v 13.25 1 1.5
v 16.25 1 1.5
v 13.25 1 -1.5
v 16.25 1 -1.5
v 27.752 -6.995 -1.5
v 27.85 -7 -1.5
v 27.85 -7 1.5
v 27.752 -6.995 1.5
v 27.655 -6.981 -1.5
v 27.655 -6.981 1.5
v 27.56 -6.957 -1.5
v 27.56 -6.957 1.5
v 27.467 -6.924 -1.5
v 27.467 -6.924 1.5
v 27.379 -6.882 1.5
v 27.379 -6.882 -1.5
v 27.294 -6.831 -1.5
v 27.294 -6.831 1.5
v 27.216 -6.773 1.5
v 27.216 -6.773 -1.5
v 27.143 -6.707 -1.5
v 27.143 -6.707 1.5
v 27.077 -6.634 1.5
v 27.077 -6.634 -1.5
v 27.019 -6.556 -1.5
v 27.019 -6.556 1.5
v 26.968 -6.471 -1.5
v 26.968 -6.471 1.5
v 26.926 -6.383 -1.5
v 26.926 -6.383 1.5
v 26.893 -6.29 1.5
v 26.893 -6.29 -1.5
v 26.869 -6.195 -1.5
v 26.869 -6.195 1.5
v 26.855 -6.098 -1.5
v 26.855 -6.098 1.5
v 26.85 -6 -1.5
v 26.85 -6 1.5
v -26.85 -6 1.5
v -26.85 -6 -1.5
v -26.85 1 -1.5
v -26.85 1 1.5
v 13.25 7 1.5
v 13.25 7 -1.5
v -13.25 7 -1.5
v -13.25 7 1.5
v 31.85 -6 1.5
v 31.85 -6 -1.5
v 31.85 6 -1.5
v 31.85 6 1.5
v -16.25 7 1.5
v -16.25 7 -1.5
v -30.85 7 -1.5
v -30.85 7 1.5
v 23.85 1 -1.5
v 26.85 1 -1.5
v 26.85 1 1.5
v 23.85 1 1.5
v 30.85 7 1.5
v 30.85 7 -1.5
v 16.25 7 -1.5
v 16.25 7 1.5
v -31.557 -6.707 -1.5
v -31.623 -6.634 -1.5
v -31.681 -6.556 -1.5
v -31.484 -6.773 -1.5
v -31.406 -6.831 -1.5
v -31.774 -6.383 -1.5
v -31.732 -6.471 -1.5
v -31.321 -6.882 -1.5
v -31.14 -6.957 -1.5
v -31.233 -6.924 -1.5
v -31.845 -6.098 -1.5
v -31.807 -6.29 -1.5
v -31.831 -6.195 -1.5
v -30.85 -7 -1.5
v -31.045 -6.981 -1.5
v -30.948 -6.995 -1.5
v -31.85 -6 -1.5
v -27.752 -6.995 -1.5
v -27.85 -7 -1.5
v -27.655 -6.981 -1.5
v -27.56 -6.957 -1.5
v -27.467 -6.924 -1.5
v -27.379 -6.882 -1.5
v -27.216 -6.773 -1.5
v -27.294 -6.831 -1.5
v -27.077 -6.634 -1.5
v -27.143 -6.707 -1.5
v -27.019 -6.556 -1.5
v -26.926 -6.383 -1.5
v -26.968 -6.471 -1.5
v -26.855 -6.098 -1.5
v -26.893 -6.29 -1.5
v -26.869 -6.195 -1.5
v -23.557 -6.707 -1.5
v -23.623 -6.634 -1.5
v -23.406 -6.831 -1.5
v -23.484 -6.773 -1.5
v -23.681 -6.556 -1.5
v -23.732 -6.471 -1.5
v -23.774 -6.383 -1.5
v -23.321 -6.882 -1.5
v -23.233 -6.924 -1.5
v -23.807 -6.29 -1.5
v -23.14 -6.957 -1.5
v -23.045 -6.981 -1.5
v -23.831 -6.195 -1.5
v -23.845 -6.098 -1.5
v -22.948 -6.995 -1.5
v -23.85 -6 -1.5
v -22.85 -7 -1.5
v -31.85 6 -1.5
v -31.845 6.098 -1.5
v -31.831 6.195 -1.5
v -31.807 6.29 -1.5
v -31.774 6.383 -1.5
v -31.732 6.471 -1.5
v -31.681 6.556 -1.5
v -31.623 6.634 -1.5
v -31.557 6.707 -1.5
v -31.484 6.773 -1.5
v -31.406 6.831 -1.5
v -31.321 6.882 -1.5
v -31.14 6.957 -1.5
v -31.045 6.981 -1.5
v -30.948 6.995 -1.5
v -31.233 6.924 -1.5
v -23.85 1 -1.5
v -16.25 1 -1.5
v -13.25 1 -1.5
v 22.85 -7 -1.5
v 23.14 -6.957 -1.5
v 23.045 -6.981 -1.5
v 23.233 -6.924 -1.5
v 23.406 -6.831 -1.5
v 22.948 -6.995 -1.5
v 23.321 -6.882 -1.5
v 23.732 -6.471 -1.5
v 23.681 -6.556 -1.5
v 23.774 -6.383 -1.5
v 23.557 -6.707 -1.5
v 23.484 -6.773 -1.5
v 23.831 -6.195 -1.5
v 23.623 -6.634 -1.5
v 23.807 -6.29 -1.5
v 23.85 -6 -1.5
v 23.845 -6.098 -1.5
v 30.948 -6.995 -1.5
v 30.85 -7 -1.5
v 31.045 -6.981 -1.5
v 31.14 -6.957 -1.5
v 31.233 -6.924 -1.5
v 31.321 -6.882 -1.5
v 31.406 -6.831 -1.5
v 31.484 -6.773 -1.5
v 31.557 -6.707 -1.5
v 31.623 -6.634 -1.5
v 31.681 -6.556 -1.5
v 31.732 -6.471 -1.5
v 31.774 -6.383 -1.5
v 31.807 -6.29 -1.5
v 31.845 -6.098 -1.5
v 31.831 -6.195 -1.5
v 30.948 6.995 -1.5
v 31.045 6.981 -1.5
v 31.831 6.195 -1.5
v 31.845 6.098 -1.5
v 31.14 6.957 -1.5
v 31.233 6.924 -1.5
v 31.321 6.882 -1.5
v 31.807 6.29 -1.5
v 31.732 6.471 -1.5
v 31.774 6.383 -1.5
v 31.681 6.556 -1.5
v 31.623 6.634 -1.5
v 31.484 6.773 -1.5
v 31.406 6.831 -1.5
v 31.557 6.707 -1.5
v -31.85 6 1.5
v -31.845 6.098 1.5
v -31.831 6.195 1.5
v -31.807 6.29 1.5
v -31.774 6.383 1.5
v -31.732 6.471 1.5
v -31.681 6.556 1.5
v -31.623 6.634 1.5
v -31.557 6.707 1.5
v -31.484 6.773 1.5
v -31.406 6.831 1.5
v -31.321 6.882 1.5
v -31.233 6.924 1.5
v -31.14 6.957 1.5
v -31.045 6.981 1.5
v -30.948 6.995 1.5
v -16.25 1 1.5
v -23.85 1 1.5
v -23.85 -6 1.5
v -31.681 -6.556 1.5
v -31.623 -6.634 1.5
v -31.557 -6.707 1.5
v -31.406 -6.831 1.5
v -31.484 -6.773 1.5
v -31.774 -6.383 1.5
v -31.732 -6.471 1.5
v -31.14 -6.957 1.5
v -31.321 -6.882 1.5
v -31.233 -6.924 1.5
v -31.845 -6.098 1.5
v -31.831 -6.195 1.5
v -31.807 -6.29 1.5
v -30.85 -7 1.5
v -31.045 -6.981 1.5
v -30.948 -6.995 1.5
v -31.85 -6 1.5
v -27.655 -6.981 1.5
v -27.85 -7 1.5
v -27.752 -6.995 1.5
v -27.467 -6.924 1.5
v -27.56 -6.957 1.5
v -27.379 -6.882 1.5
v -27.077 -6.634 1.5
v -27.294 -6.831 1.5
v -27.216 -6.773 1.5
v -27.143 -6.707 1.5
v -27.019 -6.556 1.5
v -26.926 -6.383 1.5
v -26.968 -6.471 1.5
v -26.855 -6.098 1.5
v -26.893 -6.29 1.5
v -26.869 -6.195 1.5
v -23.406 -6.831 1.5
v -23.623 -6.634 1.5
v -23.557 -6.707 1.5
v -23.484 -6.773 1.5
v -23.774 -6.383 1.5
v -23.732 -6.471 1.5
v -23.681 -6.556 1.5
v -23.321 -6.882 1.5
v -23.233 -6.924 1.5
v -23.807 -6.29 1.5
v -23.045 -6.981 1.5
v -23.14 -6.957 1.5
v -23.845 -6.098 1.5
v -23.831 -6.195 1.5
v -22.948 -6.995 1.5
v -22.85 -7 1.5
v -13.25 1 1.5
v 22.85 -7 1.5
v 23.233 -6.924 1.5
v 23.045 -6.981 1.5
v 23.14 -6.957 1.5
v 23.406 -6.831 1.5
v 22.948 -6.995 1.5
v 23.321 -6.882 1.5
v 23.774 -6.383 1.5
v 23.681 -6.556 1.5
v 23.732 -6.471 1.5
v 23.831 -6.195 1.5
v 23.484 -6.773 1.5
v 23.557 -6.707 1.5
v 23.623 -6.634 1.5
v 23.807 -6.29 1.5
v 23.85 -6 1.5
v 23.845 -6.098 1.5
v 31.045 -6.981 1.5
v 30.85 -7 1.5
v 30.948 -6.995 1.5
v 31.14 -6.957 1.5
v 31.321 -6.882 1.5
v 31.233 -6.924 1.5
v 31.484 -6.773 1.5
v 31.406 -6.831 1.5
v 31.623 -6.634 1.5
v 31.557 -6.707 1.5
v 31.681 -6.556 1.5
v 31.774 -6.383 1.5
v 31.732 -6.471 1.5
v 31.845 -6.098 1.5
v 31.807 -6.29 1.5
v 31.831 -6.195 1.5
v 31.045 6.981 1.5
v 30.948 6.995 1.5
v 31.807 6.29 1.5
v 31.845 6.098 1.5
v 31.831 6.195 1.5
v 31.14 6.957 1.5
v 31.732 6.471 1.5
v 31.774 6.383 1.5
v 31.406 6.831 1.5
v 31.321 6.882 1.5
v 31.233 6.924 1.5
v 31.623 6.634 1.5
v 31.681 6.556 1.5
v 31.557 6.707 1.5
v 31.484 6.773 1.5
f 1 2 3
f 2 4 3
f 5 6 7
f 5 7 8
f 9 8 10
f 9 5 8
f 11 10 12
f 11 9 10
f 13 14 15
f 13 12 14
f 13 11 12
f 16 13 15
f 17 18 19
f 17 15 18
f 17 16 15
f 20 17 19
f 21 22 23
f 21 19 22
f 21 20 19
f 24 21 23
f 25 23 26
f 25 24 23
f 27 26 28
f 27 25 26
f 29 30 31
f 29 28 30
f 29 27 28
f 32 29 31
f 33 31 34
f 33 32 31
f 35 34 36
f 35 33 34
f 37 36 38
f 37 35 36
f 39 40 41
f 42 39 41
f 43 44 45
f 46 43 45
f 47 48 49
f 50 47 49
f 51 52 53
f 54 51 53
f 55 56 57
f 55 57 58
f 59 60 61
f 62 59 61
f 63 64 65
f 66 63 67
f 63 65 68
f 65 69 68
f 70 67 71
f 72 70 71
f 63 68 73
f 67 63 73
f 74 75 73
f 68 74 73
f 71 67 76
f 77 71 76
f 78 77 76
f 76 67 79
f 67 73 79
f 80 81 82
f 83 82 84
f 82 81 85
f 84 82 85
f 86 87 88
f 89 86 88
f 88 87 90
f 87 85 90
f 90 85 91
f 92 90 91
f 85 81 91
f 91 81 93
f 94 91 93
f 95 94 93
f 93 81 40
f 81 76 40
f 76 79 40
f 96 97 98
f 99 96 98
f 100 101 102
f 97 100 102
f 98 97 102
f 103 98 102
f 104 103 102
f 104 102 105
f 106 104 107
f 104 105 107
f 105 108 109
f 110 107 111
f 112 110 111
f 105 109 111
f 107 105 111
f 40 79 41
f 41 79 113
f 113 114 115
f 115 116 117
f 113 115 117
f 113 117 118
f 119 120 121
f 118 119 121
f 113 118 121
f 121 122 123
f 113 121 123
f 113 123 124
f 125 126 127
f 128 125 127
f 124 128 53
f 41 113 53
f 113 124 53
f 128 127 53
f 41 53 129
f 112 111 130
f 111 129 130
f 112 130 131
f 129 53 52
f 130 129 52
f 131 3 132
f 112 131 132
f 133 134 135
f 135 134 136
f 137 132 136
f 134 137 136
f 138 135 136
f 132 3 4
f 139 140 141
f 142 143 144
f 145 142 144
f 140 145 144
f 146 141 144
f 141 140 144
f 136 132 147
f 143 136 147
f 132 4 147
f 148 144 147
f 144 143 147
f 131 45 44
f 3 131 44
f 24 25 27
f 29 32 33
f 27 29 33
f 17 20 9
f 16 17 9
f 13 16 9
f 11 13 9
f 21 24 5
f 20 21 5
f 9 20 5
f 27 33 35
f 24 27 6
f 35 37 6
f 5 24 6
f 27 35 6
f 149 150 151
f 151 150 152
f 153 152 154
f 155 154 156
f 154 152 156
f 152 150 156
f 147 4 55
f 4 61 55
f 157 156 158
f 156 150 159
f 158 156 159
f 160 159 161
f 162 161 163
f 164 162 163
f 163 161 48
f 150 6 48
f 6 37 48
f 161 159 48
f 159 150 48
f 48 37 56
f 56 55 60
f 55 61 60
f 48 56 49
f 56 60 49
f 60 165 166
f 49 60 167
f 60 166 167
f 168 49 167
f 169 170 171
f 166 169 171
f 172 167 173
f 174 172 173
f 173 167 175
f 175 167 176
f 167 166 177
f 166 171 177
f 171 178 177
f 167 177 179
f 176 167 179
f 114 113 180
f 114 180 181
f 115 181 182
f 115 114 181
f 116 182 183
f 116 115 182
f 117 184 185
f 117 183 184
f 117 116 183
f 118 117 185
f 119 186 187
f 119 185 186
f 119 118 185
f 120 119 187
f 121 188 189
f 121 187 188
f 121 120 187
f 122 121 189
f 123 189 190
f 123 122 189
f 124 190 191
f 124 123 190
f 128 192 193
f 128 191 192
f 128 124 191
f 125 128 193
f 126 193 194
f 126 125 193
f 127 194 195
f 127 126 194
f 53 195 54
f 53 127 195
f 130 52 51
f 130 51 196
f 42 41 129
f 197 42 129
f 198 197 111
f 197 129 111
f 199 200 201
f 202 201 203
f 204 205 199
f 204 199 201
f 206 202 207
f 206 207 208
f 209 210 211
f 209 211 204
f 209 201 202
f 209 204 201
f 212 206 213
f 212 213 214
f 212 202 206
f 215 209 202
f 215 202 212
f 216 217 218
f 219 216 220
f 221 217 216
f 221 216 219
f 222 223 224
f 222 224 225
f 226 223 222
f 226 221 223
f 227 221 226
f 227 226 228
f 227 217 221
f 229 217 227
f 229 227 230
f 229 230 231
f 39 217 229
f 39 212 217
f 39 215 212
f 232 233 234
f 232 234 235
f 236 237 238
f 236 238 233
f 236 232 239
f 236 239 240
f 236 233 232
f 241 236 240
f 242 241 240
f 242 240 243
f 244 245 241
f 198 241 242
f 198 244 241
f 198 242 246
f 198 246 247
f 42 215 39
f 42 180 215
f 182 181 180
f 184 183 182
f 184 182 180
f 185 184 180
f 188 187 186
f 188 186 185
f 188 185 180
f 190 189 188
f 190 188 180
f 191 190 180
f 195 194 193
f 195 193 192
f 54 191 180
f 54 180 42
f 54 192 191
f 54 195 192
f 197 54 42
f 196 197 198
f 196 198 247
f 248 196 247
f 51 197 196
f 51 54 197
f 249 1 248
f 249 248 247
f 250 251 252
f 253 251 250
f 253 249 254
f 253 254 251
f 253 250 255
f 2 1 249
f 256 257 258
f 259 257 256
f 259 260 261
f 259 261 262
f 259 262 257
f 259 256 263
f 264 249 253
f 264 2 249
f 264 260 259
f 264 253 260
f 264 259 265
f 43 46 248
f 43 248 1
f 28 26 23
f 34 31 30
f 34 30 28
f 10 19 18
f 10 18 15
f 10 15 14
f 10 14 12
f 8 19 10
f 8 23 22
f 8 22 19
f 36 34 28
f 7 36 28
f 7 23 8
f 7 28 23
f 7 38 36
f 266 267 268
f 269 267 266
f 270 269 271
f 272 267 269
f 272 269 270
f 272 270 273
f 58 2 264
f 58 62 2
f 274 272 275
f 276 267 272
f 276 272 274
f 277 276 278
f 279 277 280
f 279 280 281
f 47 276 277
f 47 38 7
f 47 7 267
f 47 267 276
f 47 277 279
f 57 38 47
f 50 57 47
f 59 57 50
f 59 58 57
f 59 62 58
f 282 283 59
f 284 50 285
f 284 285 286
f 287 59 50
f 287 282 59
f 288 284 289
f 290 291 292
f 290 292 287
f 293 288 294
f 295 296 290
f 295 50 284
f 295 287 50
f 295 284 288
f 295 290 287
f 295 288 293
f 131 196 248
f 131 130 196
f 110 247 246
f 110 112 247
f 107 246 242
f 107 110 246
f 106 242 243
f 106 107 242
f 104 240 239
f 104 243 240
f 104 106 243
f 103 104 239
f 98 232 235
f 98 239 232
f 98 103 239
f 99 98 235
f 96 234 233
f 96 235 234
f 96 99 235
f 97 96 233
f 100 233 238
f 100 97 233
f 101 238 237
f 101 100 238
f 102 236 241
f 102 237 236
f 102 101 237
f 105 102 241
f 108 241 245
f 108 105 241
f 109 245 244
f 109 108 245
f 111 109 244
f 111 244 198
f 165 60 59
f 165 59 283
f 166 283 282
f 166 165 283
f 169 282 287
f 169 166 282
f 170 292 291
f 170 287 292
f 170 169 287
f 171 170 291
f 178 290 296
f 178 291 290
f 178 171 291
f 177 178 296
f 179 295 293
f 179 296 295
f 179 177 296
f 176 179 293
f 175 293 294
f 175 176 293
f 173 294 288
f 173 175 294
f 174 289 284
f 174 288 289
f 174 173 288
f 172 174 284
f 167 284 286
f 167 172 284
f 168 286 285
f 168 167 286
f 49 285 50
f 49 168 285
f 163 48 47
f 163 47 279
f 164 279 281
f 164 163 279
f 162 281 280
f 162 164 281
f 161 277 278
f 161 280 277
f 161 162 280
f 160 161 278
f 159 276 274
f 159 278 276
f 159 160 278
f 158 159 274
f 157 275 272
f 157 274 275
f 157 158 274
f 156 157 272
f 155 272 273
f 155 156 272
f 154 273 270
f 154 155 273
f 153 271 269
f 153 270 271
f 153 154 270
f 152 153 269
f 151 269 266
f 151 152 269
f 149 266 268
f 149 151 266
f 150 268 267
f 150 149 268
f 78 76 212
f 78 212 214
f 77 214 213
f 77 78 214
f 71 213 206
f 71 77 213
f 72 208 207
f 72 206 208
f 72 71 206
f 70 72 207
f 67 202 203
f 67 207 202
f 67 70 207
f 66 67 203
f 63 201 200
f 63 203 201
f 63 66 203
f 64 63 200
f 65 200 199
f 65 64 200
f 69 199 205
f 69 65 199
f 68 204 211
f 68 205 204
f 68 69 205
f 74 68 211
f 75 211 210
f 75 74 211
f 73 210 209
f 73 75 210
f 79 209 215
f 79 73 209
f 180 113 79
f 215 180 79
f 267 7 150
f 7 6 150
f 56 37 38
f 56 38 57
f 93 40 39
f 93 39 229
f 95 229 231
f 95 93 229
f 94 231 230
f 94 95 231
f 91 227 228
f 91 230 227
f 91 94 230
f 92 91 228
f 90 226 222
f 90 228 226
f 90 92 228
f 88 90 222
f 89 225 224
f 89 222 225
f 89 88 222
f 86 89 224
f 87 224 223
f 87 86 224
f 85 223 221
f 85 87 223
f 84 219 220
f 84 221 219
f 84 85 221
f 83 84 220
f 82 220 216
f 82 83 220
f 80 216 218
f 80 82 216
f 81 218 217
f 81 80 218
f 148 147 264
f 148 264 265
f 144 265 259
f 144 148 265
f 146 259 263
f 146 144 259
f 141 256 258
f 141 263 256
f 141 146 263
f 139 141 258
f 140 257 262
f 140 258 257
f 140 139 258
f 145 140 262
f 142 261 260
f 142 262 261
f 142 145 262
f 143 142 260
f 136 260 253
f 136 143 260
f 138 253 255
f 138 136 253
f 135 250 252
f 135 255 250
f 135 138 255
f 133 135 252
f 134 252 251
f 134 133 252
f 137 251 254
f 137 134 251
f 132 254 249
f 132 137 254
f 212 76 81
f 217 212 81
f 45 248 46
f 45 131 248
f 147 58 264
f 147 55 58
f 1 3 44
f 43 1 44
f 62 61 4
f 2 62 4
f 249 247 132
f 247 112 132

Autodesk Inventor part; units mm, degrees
ref_plane "YZ Plane" through (0, 0, 0) normal (1, 0, 0) x (0, 1, 0)
ref_plane "XZ Plane" through (0, 0, 0) normal (0, 1, 0) x (-1, 0, 0)
ref_plane "XY Plane" through (0, 0, 0) normal (0, 0, 1) x (1, 0, 0)
sketch "草圖1" plane through (0, 0, 0) normal (0, 0, 1) x (1, 0, 0)
  line L0 (31.85, -6) -> (31.85, 6)
  line L1 (-31.85, 6) -> (-31.85, -6)
  line L2 (-30.85, -7) -> (-27.85, -7)
  line L3 (-22.85, -7) -> (22.85, -7)
  line L4 (27.85, -7) -> (30.85, -7)
  line L5 (0, 22.1211) -> (0, -32.4412) construction
  arc A0 (-30.85, 7) -> (-31.85, 6) centre (-30.85, 6) ccw
  arc A1 (-31.85, -6) -> (-30.85, -7) centre (-30.85, -6) ccw
  arc A2 (-27.85, -7) -> (-26.85, -6) centre (-27.85, -6) ccw
  arc A3 (-23.85, -6) -> (-22.85, -7) centre (-22.85, -6) ccw
  arc A4 (30.85, -7) -> (31.85, -6) centre (30.85, -6) ccw
  arc A5 (31.85, 6) -> (30.85, 7) centre (30.85, 6) ccw
  line L6 (-26.85, -6) -> (-26.85, 1)
  line L7 (-26.85, 1) -> (-23.85, 1)
  line L8 (-23.85, 1) -> (-23.85, -6)
  arc A6 (26.85, -6) -> (27.85, -7) centre (27.85, -6) ccw
  arc A7 (22.85, -7) -> (23.85, -6) centre (22.85, -6) ccw
  line L9 (26.85, -6) -> (26.85, 1)
  line L10 (26.85, 1) -> (23.85, 1)
  line L11 (23.85, 1) -> (23.85, -6)
  line L12 (-16.25, 7) -> (-16.25, 1)
  line L13 (-16.25, 1) -> (-13.25, 1)
  line L14 (-13.25, 1) -> (-13.25, 7)
  line L15 (-14.75, -1.2757) -> (-14.75, 3.2757) construction
  line L16 (16.25, 7) -> (16.25, 1)
  line L17 (16.25, 1) -> (13.25, 1)
  line L18 (13.25, 1) -> (13.25, 7)
  line L19 (-31.85, -7) -> (31.85, -7) construction
  line L20 (31.85, -7) -> (31.85, 7) construction
  line L21 (31.85, 7) -> (-31.85, 7) construction
  line L22 (-31.85, 7) -> (-31.85, -7) construction
  line L23 (-31.85, -7) -> (31.85, 7) construction
  line L24 (31.85, -7) -> (-31.85, 7) construction
  line L25 (-16.25, 7) -> (-30.85, 7)
  line L26 (30.85, 7) -> (16.25, 7)
  line L27 (13.25, 7) -> (-13.25, 7)
  line L28 (-26.85, -6) -> (-26.85, -3)
  line L29 (26.85, -3) -> (26.85, -6)
  point P0 (0, 0)
  point P1 (-14.75, 1)
  point P2 (26.85, -6)
  dimension "d5" = 1
  dimension "d6" = 1
  dimension "d25" = 3
  dimension "d26" = 8
  dimension "d28" = 5
  dimension "d29" = 23.85
  dimension "d30" = 6
  dimension "d31" = 3
  dimension "d32" = 14.75
  dimension "d34" = 14
extrude "擠出1" add sketch "草圖1" along normal mid plane 3
properties part number "test"
